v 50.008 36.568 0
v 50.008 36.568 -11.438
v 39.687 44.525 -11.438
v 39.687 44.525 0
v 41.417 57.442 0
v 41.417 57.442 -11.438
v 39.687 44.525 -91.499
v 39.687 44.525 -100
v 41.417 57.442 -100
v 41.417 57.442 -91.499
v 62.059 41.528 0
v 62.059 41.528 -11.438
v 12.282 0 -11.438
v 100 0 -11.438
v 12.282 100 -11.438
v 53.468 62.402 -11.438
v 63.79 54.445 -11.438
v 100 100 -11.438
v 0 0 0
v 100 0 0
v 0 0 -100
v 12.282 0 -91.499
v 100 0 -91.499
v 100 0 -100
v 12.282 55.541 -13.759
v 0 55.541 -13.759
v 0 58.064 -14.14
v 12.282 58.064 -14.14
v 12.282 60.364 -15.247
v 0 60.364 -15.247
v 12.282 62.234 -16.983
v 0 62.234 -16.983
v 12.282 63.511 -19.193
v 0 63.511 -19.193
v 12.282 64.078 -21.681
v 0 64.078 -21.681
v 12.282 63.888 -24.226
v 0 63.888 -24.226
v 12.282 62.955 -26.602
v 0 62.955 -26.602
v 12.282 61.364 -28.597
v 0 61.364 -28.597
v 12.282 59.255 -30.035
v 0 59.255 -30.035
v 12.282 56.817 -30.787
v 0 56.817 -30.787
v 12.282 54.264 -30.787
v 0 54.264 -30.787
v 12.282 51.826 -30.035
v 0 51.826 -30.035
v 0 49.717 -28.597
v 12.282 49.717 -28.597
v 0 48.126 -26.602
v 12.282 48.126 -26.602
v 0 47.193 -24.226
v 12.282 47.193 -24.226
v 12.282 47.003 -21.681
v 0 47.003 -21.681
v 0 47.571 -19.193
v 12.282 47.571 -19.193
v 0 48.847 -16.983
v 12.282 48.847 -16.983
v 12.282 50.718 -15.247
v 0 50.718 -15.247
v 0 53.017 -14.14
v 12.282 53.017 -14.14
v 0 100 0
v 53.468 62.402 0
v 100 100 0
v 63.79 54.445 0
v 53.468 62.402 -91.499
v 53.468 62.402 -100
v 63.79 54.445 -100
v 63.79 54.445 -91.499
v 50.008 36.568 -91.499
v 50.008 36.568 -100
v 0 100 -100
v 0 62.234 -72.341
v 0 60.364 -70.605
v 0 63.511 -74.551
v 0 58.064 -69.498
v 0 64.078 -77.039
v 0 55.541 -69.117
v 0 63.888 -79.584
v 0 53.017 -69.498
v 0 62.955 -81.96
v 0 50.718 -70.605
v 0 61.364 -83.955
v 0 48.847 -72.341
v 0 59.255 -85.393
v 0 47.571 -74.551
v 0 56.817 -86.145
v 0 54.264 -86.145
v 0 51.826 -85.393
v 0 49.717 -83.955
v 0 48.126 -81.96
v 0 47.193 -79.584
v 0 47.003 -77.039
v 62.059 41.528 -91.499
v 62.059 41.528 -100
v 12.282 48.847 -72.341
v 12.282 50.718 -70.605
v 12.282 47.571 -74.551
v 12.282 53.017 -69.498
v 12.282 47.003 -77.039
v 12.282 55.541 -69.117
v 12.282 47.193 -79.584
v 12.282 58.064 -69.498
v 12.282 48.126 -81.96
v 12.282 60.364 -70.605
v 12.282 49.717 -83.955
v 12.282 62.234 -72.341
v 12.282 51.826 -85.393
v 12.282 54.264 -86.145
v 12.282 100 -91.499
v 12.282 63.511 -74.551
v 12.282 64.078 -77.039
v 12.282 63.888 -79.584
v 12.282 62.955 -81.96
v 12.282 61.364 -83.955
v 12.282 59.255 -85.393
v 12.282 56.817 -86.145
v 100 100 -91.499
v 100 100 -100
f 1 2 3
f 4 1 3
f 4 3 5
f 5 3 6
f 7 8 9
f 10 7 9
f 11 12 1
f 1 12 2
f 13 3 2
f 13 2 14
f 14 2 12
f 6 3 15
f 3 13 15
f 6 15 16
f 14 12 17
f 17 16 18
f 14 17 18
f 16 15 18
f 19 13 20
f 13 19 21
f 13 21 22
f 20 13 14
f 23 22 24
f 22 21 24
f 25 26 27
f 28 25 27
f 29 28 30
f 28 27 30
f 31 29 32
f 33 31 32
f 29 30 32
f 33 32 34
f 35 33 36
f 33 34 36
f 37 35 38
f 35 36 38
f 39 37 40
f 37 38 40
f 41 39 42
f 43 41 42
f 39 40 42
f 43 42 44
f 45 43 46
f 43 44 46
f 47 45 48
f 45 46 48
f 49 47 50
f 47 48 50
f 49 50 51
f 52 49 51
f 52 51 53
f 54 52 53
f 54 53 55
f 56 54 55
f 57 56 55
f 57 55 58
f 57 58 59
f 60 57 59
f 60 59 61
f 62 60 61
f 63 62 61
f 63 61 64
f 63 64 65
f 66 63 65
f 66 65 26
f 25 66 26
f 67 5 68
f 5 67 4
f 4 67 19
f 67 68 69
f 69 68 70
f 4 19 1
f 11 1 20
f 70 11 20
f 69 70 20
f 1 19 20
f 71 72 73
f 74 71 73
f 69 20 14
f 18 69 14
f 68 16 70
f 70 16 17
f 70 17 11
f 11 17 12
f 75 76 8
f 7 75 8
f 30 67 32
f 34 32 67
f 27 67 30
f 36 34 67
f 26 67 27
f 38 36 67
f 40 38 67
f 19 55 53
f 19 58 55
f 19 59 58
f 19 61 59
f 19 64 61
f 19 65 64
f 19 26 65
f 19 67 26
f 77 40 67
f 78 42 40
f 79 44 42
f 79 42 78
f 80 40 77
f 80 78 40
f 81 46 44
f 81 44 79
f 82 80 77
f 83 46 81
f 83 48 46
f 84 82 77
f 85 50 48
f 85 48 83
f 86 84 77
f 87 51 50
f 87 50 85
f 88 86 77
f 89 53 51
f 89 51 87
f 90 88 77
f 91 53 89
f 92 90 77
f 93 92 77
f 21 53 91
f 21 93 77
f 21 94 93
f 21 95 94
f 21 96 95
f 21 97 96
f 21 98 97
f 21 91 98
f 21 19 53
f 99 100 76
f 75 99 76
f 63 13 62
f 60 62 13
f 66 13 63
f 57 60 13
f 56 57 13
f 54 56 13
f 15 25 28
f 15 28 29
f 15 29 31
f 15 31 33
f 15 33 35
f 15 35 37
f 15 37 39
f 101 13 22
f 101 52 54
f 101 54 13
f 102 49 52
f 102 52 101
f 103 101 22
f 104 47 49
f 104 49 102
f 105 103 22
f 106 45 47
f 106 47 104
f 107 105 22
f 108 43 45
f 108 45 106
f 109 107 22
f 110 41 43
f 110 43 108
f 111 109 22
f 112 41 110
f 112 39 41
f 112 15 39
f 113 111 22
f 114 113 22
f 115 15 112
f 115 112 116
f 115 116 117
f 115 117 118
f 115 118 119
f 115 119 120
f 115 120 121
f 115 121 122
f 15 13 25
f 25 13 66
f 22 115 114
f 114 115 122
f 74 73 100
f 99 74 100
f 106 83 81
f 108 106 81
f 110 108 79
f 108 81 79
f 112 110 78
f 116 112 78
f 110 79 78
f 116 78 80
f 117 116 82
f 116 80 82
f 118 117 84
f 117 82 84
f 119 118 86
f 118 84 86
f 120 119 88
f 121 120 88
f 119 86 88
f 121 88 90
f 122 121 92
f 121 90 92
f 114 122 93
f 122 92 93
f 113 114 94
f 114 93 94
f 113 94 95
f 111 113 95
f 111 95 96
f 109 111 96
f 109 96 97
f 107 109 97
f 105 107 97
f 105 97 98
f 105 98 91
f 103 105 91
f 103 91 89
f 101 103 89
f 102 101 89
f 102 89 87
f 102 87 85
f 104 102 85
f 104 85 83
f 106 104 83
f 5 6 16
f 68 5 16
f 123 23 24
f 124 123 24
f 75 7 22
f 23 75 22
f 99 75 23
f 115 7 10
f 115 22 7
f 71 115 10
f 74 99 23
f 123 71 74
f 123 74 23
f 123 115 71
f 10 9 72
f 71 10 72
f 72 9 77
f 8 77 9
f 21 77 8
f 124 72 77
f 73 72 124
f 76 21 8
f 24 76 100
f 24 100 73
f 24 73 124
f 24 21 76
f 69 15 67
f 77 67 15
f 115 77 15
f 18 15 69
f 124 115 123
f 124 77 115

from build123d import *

# Parameters (mm, degrees)
SKETCH1_W           = 100
SKETCH1_H           = 100
BOSS_EXTRUDE1_DEPTH = 100
SKETCH2_W           = 87.717538768
SKETCH2_H           = 80.061351375
CUT_EXTRUDE1_DEPTH  = 100
CUT_EXTRUDE2_DEPTH  = 110
SKETCH4_R           = 8.561791054
CUT_EXTRUDE3_DEPTH  = 110


with BuildPart() as part:
    # Sketch1 → Boss-Extrude1 (new body)
    with BuildSketch(Plane(origin=(0, 0, 0), x_dir=(1, 0, 0), z_dir=(0, 1, 0))):
        with Locations((50, 50)):
            Rectangle(SKETCH1_W, SKETCH1_H)
    extrude(amount=BOSS_EXTRUDE1_DEPTH)

    # Sketch2 → Cut-Extrude1 (cut)
    with BuildSketch(Plane(origin=(0, 100, 0), x_dir=(1, 0, 0), z_dir=(0, 1, 0))):
        with Locations((56.141230616, 51.468802688)):
            Rectangle(SKETCH2_W, SKETCH2_H)
    extrude(amount=-CUT_EXTRUDE1_DEPTH, mode=Mode.SUBTRACT)

    # Sketch3 → Cut-Extrude2 (cut)
    with BuildSketch(Plane(origin=(0, 0, -100), x_dir=(-1, 0, 0), z_dir=(0, 0, -1))):
        Polygon((-39.686546089, 44.525018682), (-41.416801354, 57.44192417), (-53.468297277, 62.401931899), (-63.789537935, 54.44503414), (-62.05928267, 41.528128652), (-50.007786746, 36.568120923), align=None)
    extrude(amount=-CUT_EXTRUDE2_DEPTH, mode=Mode.SUBTRACT)

    # Sketch4 → Cut-Extrude3 (cut)
    with BuildSketch(Plane.ZY):
        with Locations((-77.678939526, 55.540564347)):
            Circle(SKETCH4_R)
        with Locations((-22.321060474, 55.540564347)):
            Circle(SKETCH4_R)
    extrude(amount=-CUT_EXTRUDE3_DEPTH, mode=Mode.SUBTRACT)


solid = part.part
